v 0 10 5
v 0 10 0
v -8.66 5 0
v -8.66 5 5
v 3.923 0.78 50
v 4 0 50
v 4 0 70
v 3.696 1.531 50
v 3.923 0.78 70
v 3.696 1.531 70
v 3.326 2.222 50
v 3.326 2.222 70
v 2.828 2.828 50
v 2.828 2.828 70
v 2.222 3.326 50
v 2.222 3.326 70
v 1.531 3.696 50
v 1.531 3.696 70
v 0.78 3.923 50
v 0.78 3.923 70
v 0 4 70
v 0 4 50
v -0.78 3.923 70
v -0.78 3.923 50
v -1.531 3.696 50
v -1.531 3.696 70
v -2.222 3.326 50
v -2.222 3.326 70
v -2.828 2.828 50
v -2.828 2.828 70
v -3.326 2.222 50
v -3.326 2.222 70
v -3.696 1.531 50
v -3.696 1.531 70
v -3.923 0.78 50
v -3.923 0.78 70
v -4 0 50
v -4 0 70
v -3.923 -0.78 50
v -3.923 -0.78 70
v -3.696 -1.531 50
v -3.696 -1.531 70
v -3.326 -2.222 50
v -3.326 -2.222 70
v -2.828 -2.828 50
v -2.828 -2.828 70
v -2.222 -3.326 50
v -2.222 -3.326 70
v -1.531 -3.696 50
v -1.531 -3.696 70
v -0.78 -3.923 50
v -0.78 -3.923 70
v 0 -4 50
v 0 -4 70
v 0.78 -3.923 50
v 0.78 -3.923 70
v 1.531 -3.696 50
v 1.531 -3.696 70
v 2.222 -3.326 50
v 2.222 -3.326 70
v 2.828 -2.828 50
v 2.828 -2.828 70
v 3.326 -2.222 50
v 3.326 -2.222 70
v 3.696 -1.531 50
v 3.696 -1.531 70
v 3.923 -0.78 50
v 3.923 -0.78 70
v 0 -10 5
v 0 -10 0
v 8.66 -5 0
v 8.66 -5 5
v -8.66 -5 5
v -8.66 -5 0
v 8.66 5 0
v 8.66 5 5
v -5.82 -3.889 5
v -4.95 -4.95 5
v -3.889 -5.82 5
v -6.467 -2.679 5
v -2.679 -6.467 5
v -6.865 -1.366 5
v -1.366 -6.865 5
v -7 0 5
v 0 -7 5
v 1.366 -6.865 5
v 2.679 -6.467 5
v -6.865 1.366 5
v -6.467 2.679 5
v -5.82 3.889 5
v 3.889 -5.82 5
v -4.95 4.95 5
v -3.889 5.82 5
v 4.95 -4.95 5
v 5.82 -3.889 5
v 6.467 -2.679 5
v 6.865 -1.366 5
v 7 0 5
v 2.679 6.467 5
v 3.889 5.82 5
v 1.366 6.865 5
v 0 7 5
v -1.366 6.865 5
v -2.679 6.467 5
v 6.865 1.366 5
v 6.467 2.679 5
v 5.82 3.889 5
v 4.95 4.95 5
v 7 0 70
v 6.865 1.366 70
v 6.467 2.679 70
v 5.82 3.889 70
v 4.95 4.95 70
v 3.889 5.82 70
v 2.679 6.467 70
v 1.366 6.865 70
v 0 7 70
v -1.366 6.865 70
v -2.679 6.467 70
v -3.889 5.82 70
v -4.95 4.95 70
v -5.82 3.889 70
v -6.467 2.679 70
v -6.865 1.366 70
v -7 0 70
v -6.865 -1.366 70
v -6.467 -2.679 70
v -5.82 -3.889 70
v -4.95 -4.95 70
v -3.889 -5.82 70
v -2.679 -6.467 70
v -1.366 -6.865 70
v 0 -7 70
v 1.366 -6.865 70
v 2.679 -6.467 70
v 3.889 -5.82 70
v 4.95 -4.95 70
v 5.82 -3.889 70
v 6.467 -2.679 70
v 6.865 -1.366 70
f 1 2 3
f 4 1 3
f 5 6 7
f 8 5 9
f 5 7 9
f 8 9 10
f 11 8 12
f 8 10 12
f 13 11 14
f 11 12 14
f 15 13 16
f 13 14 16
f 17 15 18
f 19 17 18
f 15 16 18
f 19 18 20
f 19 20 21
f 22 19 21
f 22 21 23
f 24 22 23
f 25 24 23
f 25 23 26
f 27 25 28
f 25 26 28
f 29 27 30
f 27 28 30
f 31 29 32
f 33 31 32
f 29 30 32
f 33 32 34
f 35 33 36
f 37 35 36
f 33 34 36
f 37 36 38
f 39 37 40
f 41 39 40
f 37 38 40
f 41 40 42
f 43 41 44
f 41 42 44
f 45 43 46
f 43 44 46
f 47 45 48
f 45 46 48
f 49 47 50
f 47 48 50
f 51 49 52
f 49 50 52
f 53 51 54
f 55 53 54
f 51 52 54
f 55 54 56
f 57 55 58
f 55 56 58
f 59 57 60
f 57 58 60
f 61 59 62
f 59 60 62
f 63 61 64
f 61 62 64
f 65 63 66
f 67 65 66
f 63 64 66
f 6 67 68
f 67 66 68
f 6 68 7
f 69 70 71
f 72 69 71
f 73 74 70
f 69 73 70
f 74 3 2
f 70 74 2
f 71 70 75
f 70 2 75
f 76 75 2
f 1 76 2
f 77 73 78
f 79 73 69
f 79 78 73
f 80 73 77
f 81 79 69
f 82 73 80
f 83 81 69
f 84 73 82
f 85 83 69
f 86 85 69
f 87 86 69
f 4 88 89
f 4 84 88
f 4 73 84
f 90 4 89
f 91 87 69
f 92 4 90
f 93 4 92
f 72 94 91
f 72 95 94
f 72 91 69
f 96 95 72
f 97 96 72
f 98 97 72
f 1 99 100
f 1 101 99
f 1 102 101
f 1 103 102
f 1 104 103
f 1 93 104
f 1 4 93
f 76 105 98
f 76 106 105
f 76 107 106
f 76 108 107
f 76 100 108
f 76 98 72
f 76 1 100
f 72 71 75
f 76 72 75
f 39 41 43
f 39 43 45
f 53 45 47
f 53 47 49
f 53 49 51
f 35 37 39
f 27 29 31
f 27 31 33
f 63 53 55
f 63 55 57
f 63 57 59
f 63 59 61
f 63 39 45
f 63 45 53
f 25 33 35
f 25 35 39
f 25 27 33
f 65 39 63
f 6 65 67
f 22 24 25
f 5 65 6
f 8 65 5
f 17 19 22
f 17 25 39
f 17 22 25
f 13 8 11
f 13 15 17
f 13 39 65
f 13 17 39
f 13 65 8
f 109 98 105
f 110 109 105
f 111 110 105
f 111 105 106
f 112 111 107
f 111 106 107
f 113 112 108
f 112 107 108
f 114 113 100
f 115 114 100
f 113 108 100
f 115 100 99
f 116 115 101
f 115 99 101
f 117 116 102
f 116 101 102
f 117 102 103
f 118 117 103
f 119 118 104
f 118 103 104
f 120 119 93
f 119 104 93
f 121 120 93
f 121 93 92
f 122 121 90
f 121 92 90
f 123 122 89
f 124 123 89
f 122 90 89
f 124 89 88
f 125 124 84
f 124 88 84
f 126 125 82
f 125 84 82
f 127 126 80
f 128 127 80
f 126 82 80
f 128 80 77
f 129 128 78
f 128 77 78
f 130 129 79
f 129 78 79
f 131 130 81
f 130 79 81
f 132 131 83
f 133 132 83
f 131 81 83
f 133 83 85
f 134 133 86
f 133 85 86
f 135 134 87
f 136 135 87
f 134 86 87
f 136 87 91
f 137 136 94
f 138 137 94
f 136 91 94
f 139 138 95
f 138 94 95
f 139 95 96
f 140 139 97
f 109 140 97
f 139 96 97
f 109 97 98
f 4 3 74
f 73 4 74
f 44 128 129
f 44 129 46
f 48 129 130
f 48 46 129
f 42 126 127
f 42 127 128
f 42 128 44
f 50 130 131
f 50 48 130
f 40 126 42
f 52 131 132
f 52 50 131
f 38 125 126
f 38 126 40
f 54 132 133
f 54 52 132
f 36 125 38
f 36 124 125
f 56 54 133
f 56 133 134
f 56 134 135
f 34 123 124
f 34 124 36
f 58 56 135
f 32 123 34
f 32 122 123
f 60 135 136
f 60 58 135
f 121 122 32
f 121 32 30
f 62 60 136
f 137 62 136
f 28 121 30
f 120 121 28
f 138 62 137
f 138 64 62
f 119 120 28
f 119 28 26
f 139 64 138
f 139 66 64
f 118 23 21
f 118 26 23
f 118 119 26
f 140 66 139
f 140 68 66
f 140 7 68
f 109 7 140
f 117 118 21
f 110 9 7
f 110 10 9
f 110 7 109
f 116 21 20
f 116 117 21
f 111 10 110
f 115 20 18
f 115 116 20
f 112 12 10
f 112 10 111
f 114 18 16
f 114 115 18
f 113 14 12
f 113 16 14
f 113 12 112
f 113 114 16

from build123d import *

# Parameters (mm, degrees)
BOSS_EXTRUDE1_DEPTH = 5
SKETCH2_R           = 7
BOSS_EXTRUDE2_DEPTH = 65
SKETCH3_R           = 4
CUT_EXTRUDE1_DEPTH  = 20


with BuildPart() as part:
    # Sketch1 → Boss-Extrude1 (new body)
    with BuildSketch(Plane.XY):
        Polygon((8.660254038, -5), (8.660254038, 5), (0, 10), (-8.660254038, 5), (-8.660254038, -5), (0, -10), align=None)
    extrude(amount=BOSS_EXTRUDE1_DEPTH)

    # Sketch2 → Boss-Extrude2 (add)
    with BuildSketch(Plane.XY.offset(5)):
        Circle(SKETCH2_R)
    extrude(amount=BOSS_EXTRUDE2_DEPTH)

    # Sketch3 → Cut-Extrude1 (cut)
    with BuildSketch(Plane.XY.offset(70)):
        Circle(SKETCH3_R)
    extrude(amount=-CUT_EXTRUDE1_DEPTH, mode=Mode.SUBTRACT)


solid = part.part
